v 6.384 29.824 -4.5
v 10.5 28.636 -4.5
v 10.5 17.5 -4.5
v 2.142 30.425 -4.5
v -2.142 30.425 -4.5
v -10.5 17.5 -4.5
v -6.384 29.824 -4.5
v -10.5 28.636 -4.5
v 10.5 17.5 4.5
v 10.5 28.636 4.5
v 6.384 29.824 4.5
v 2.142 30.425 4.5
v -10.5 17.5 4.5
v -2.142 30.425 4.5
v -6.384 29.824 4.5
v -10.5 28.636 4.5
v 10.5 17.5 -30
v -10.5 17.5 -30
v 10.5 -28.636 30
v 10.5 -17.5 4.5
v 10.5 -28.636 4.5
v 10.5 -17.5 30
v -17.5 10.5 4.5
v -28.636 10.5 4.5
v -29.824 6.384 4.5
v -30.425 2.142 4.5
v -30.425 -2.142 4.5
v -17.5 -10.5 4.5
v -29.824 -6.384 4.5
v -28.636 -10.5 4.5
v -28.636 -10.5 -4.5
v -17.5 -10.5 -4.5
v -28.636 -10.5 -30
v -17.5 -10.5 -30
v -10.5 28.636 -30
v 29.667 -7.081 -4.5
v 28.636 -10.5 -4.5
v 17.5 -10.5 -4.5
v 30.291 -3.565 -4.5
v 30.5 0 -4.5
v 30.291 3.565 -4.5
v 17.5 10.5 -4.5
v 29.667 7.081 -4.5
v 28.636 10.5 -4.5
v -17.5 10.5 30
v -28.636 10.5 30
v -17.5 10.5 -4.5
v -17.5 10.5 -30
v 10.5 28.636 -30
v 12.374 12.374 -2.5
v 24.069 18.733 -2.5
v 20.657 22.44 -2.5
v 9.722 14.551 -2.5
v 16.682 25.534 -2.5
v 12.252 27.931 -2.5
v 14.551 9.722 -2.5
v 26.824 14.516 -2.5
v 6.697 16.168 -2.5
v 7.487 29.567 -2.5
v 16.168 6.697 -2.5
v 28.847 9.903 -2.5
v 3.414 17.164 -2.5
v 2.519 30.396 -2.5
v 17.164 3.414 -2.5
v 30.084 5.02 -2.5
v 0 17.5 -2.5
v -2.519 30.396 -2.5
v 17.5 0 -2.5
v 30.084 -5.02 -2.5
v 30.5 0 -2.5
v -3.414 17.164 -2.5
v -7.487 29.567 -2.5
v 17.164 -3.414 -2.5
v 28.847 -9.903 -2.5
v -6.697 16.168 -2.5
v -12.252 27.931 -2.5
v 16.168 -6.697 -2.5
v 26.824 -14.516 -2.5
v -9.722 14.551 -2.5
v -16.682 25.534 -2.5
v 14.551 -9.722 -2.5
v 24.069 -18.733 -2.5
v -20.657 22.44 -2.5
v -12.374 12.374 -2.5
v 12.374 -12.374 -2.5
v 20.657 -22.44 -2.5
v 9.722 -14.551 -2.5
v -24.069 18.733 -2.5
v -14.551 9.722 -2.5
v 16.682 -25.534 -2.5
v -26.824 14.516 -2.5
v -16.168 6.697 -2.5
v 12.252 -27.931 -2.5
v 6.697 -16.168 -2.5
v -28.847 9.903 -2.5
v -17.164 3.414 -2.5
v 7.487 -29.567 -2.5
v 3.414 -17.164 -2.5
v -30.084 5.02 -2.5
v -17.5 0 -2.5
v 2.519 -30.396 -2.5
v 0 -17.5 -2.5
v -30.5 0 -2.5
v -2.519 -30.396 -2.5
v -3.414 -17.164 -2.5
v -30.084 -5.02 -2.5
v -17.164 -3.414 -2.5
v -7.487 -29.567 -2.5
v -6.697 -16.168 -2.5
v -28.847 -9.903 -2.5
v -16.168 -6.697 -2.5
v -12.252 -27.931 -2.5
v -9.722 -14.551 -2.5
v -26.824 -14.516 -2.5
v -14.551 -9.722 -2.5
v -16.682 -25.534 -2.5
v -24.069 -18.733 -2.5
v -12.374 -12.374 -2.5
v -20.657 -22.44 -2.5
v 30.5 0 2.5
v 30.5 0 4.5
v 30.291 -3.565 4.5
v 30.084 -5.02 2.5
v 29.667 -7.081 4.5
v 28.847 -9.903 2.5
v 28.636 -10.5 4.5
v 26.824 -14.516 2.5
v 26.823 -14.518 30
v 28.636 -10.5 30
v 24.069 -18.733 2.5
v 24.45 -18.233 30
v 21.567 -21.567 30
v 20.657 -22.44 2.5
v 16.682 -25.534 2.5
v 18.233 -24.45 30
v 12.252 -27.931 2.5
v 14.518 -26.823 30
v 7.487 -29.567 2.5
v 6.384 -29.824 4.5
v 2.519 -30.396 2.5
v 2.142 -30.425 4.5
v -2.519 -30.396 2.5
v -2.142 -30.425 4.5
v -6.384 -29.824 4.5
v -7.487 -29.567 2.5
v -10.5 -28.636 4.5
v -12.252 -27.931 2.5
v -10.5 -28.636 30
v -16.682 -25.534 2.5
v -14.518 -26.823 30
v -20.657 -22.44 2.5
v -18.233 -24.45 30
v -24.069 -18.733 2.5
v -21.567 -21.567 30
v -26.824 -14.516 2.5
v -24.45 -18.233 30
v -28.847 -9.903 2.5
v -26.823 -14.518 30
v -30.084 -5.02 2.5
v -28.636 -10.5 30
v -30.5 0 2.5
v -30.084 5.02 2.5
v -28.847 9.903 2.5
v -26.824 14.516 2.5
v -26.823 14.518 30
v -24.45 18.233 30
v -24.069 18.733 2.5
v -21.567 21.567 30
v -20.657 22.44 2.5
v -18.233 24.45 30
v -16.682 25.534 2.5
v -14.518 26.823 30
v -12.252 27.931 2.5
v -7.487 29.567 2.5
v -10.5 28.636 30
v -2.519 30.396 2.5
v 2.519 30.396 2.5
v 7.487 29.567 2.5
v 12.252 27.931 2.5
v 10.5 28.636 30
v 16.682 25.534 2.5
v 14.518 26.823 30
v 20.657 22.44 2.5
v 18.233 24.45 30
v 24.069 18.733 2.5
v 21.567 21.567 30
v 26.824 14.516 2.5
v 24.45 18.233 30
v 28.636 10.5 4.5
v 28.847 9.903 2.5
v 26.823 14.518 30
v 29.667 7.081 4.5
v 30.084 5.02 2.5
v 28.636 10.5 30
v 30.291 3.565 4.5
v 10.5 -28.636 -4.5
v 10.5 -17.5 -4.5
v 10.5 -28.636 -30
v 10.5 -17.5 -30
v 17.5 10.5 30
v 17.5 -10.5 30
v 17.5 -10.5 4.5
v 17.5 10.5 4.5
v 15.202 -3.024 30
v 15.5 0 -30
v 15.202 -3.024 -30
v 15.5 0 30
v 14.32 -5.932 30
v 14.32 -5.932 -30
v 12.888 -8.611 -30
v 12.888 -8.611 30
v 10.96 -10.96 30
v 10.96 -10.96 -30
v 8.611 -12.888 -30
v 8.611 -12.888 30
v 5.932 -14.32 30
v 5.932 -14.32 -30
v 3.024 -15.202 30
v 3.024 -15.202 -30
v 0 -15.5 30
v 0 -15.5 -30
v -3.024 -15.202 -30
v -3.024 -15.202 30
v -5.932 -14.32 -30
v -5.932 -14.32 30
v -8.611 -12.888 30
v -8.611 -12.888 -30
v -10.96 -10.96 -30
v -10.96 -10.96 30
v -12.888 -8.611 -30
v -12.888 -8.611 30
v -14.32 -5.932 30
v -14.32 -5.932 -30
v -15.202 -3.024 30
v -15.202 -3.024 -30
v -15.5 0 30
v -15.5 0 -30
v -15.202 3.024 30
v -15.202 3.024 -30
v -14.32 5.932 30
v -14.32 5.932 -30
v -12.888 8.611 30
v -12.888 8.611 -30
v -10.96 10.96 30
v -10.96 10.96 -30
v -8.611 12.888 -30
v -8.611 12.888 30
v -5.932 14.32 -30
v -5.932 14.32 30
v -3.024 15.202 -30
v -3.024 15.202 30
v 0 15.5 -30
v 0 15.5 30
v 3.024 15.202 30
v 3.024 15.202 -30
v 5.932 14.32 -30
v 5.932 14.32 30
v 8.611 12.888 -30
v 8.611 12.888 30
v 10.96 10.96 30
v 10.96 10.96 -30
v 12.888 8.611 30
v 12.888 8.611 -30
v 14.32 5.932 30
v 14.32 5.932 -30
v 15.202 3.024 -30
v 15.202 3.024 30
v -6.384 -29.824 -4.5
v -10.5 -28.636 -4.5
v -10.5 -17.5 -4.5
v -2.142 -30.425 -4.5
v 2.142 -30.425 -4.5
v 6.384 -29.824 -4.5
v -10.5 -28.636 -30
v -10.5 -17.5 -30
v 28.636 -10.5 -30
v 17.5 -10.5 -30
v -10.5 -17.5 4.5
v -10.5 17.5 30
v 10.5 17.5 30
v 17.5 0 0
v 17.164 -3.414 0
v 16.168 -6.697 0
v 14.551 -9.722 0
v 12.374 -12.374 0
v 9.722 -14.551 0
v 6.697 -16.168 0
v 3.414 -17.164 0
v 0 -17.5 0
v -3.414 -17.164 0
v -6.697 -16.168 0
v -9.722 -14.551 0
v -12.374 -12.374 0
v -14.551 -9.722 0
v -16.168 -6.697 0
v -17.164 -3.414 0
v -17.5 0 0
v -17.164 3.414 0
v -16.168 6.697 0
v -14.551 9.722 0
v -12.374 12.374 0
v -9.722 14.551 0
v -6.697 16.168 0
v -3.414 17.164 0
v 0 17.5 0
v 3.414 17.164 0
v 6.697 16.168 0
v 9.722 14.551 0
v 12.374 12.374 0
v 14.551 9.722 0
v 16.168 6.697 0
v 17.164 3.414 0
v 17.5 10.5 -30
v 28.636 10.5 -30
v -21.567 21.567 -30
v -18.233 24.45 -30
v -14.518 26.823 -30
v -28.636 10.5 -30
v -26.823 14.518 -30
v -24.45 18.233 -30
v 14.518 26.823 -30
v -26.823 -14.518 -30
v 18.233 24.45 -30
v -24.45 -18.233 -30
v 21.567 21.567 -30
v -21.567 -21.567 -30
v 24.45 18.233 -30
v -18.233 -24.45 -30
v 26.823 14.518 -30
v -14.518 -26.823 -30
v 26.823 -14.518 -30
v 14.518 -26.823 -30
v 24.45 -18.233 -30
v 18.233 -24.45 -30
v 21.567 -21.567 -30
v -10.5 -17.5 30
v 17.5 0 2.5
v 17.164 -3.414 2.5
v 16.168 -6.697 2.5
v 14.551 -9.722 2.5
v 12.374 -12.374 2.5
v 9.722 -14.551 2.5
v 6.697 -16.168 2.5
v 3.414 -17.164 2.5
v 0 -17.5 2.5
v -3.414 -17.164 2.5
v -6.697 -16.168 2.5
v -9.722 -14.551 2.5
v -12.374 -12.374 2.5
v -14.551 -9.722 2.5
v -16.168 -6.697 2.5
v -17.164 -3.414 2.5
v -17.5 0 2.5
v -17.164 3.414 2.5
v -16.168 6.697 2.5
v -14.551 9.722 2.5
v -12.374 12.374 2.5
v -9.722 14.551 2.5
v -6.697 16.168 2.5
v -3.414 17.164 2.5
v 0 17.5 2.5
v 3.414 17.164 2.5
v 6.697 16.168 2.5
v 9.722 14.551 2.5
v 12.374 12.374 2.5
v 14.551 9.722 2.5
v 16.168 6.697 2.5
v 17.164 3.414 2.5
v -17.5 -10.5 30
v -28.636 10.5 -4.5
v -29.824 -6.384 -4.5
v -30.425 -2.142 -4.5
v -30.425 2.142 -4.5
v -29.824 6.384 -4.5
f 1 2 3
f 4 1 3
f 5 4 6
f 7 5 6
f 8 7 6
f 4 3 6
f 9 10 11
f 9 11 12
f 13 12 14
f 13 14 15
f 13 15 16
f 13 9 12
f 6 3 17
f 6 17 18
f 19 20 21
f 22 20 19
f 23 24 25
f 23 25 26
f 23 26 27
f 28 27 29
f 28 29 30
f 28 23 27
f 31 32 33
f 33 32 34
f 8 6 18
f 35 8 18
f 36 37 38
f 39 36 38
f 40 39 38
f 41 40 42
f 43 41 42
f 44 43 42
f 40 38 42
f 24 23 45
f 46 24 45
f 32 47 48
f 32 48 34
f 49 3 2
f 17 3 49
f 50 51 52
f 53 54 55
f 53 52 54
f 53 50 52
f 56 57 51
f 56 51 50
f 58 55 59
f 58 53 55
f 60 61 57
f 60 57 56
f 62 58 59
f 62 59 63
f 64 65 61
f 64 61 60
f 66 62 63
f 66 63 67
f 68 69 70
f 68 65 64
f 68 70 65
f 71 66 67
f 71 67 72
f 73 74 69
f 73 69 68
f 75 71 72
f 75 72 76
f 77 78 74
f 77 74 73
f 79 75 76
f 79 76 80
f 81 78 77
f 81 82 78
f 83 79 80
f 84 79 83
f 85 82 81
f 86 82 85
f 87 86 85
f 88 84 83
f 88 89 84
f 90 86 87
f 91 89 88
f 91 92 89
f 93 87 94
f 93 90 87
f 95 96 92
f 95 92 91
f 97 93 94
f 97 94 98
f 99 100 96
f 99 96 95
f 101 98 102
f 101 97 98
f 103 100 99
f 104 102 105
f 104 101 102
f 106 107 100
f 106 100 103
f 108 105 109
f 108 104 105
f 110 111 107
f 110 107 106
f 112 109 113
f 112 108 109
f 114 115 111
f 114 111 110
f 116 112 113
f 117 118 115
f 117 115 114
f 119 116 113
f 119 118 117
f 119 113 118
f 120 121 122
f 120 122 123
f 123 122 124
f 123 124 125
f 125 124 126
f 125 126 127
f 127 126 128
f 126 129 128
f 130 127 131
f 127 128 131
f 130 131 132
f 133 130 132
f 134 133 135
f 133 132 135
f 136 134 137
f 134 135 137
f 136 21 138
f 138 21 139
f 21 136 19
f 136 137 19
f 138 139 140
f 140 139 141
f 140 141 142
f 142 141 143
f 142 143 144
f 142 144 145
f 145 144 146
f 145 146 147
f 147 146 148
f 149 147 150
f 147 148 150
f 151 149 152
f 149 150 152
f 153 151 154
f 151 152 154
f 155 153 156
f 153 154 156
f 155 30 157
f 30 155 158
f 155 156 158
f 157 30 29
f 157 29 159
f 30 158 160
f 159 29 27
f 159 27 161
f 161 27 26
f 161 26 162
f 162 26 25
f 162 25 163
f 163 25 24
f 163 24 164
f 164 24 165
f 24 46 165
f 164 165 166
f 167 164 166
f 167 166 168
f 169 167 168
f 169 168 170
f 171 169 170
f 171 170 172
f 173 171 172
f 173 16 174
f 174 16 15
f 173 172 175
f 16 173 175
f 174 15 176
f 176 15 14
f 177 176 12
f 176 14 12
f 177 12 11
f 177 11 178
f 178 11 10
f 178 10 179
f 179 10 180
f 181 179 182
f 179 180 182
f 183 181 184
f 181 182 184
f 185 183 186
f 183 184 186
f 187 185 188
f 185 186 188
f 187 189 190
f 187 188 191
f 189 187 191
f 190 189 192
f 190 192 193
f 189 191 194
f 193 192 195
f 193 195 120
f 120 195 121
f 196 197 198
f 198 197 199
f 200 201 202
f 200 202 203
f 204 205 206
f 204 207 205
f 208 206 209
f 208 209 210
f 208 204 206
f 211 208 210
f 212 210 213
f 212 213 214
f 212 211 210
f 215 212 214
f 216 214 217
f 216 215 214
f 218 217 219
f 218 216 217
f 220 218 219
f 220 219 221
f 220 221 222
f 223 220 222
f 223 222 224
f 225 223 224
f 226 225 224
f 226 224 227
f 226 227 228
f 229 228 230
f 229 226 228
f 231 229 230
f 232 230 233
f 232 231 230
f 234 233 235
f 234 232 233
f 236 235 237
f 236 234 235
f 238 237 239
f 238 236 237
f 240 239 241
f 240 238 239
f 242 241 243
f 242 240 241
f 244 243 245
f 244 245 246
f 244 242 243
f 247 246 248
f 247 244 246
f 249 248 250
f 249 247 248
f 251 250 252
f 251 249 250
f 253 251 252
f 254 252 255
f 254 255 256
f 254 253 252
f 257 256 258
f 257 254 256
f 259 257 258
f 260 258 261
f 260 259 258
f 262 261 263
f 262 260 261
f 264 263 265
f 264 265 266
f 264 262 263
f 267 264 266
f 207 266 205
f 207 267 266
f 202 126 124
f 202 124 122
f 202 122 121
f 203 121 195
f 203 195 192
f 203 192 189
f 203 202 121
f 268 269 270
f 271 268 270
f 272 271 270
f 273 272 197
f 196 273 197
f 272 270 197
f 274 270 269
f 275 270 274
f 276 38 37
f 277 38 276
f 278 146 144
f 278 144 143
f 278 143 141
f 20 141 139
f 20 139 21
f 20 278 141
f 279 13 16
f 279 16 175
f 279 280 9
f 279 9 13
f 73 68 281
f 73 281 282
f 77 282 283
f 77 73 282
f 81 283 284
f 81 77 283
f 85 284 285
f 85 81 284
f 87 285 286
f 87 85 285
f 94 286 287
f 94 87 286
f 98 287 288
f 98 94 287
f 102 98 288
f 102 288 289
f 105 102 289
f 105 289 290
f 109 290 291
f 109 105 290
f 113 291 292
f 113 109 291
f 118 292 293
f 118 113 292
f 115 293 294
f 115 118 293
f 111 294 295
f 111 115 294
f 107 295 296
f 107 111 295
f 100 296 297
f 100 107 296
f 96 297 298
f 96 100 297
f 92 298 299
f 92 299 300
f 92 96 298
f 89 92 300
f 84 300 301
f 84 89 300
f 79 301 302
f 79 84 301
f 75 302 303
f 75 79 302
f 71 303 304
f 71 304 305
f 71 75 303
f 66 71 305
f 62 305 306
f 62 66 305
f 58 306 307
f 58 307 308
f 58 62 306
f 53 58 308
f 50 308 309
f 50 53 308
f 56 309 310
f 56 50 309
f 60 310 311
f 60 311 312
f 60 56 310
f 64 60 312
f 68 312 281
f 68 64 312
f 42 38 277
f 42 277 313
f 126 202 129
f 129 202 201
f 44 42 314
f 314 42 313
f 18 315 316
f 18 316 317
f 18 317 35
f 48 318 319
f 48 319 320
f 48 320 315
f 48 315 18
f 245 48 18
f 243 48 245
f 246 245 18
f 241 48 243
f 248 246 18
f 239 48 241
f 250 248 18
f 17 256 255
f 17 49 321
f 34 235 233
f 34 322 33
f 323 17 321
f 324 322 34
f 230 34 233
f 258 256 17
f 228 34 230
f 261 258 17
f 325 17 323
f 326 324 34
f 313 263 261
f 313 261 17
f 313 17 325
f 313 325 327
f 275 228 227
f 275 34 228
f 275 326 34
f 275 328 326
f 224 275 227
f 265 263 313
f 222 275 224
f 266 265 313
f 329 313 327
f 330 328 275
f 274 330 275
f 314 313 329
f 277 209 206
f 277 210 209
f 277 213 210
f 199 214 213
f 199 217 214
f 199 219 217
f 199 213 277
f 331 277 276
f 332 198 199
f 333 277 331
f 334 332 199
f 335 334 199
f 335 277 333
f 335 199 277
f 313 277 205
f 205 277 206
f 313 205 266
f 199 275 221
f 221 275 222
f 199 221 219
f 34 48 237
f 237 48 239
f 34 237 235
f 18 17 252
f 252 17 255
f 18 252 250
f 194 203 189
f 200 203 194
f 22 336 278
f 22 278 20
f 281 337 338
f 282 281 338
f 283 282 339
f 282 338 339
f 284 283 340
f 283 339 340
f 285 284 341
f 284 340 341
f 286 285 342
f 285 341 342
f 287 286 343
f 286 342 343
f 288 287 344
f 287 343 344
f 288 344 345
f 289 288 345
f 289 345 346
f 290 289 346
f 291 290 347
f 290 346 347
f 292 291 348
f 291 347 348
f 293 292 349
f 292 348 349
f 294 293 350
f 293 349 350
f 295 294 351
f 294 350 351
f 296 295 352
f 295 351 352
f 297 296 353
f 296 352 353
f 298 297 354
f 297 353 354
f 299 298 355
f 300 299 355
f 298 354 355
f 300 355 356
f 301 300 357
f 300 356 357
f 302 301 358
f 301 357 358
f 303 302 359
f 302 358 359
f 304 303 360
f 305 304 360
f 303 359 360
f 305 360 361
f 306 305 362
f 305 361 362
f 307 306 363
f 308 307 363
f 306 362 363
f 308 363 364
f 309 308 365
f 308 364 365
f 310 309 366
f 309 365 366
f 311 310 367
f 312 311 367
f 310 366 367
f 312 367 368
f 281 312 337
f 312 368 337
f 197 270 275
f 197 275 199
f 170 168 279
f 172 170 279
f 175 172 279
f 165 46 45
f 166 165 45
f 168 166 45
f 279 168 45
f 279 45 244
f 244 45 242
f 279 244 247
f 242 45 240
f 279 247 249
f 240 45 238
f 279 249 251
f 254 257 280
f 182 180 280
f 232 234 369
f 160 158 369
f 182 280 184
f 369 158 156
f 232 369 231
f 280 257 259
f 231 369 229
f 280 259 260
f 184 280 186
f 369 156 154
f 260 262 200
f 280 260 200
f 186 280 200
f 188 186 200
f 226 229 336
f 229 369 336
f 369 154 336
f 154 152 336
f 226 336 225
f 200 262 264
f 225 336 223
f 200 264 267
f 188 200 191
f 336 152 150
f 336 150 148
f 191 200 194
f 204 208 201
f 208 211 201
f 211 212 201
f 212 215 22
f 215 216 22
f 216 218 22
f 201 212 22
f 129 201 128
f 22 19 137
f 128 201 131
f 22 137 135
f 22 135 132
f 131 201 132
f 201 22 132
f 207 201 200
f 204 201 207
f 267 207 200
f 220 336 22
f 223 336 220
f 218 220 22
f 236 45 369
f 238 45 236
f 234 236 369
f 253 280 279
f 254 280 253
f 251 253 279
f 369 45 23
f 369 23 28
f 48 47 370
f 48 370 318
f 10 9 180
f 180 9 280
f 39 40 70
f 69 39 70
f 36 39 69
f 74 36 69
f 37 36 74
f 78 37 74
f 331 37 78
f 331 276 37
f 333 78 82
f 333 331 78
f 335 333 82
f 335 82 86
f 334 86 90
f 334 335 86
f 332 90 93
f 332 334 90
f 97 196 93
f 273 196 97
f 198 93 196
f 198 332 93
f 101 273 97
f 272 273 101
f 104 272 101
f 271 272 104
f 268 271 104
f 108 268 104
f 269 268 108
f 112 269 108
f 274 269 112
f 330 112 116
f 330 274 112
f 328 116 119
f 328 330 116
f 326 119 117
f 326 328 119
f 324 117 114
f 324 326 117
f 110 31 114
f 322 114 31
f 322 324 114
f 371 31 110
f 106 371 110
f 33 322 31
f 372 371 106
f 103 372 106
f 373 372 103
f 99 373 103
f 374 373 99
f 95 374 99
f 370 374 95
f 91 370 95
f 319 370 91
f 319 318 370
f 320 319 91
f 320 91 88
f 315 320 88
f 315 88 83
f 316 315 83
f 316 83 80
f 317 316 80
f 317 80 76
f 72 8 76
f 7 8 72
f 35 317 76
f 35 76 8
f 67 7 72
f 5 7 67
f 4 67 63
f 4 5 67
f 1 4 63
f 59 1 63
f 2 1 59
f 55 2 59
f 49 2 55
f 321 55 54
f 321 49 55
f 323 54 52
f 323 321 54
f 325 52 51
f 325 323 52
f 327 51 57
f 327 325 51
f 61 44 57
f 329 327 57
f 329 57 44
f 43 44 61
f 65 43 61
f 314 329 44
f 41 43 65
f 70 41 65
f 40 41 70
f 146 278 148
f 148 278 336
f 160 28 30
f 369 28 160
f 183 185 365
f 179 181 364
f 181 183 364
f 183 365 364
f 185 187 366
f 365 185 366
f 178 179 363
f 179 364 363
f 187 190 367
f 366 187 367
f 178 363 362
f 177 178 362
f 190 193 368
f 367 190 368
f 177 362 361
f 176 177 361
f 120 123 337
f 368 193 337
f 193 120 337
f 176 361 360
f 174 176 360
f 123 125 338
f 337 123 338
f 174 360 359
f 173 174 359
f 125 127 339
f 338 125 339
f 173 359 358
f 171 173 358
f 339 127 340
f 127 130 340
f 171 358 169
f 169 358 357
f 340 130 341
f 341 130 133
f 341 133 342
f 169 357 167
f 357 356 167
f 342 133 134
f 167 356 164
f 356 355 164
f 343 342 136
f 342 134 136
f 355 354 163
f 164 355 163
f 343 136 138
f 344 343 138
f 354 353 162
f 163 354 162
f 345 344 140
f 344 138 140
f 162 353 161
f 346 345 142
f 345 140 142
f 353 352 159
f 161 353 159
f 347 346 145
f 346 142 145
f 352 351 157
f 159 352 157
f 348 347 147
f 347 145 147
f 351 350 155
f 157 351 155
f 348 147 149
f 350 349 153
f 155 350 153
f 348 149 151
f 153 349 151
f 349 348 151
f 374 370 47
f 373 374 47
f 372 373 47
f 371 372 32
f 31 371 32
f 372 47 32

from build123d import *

# Parameters (mm, degrees)
F4_W            = 21
F4_H            = 25.5
F6_DEPTH        = 13.001
F6_COPIES_COUNT = 4


# Not quite as in the source:
# - a pattern or mirror of a feature is missing from the dataset's text; its kind, count and spacing are read off the source's solid


with BuildPart() as f5:
    # F2 (on Front) → F5 (revolve)
    with BuildSketch(Plane.XZ):
        Polygon((15.5, 30), (15.5, 0), (17.5, 0), (17.5, 2.5), (30.5, 2.5), (30.5, 30), align=None)
    revolve(axis=Axis((0, 0, 6.4842129506), (0, 0, -1)))

    # F4 (on offset) → F6 (cut, through all)
    with BuildSketch(Plane.YZ.offset(17.5)):
        with Locations((0, 17.25)):
            Rectangle(F4_W, F4_H)
    f6 = extrude(amount=F6_DEPTH, mode=Mode.SUBTRACT)

    # F6_copies: F6 ×4 about axis
    f6_copies_axis = Axis((0, 0, 0), (0, 0, 1))
    for i in range(1, F6_COPIES_COUNT):
        add(f6.rotate(f6_copies_axis, i * 360 / F6_COPIES_COUNT), mode=Mode.SUBTRACT)

    # F7: F5 across plane


with BuildPart() as f5_1:
    add(f5.part)
    add(f5.part.mirror(Plane.XY))


solid = f5_1.part
